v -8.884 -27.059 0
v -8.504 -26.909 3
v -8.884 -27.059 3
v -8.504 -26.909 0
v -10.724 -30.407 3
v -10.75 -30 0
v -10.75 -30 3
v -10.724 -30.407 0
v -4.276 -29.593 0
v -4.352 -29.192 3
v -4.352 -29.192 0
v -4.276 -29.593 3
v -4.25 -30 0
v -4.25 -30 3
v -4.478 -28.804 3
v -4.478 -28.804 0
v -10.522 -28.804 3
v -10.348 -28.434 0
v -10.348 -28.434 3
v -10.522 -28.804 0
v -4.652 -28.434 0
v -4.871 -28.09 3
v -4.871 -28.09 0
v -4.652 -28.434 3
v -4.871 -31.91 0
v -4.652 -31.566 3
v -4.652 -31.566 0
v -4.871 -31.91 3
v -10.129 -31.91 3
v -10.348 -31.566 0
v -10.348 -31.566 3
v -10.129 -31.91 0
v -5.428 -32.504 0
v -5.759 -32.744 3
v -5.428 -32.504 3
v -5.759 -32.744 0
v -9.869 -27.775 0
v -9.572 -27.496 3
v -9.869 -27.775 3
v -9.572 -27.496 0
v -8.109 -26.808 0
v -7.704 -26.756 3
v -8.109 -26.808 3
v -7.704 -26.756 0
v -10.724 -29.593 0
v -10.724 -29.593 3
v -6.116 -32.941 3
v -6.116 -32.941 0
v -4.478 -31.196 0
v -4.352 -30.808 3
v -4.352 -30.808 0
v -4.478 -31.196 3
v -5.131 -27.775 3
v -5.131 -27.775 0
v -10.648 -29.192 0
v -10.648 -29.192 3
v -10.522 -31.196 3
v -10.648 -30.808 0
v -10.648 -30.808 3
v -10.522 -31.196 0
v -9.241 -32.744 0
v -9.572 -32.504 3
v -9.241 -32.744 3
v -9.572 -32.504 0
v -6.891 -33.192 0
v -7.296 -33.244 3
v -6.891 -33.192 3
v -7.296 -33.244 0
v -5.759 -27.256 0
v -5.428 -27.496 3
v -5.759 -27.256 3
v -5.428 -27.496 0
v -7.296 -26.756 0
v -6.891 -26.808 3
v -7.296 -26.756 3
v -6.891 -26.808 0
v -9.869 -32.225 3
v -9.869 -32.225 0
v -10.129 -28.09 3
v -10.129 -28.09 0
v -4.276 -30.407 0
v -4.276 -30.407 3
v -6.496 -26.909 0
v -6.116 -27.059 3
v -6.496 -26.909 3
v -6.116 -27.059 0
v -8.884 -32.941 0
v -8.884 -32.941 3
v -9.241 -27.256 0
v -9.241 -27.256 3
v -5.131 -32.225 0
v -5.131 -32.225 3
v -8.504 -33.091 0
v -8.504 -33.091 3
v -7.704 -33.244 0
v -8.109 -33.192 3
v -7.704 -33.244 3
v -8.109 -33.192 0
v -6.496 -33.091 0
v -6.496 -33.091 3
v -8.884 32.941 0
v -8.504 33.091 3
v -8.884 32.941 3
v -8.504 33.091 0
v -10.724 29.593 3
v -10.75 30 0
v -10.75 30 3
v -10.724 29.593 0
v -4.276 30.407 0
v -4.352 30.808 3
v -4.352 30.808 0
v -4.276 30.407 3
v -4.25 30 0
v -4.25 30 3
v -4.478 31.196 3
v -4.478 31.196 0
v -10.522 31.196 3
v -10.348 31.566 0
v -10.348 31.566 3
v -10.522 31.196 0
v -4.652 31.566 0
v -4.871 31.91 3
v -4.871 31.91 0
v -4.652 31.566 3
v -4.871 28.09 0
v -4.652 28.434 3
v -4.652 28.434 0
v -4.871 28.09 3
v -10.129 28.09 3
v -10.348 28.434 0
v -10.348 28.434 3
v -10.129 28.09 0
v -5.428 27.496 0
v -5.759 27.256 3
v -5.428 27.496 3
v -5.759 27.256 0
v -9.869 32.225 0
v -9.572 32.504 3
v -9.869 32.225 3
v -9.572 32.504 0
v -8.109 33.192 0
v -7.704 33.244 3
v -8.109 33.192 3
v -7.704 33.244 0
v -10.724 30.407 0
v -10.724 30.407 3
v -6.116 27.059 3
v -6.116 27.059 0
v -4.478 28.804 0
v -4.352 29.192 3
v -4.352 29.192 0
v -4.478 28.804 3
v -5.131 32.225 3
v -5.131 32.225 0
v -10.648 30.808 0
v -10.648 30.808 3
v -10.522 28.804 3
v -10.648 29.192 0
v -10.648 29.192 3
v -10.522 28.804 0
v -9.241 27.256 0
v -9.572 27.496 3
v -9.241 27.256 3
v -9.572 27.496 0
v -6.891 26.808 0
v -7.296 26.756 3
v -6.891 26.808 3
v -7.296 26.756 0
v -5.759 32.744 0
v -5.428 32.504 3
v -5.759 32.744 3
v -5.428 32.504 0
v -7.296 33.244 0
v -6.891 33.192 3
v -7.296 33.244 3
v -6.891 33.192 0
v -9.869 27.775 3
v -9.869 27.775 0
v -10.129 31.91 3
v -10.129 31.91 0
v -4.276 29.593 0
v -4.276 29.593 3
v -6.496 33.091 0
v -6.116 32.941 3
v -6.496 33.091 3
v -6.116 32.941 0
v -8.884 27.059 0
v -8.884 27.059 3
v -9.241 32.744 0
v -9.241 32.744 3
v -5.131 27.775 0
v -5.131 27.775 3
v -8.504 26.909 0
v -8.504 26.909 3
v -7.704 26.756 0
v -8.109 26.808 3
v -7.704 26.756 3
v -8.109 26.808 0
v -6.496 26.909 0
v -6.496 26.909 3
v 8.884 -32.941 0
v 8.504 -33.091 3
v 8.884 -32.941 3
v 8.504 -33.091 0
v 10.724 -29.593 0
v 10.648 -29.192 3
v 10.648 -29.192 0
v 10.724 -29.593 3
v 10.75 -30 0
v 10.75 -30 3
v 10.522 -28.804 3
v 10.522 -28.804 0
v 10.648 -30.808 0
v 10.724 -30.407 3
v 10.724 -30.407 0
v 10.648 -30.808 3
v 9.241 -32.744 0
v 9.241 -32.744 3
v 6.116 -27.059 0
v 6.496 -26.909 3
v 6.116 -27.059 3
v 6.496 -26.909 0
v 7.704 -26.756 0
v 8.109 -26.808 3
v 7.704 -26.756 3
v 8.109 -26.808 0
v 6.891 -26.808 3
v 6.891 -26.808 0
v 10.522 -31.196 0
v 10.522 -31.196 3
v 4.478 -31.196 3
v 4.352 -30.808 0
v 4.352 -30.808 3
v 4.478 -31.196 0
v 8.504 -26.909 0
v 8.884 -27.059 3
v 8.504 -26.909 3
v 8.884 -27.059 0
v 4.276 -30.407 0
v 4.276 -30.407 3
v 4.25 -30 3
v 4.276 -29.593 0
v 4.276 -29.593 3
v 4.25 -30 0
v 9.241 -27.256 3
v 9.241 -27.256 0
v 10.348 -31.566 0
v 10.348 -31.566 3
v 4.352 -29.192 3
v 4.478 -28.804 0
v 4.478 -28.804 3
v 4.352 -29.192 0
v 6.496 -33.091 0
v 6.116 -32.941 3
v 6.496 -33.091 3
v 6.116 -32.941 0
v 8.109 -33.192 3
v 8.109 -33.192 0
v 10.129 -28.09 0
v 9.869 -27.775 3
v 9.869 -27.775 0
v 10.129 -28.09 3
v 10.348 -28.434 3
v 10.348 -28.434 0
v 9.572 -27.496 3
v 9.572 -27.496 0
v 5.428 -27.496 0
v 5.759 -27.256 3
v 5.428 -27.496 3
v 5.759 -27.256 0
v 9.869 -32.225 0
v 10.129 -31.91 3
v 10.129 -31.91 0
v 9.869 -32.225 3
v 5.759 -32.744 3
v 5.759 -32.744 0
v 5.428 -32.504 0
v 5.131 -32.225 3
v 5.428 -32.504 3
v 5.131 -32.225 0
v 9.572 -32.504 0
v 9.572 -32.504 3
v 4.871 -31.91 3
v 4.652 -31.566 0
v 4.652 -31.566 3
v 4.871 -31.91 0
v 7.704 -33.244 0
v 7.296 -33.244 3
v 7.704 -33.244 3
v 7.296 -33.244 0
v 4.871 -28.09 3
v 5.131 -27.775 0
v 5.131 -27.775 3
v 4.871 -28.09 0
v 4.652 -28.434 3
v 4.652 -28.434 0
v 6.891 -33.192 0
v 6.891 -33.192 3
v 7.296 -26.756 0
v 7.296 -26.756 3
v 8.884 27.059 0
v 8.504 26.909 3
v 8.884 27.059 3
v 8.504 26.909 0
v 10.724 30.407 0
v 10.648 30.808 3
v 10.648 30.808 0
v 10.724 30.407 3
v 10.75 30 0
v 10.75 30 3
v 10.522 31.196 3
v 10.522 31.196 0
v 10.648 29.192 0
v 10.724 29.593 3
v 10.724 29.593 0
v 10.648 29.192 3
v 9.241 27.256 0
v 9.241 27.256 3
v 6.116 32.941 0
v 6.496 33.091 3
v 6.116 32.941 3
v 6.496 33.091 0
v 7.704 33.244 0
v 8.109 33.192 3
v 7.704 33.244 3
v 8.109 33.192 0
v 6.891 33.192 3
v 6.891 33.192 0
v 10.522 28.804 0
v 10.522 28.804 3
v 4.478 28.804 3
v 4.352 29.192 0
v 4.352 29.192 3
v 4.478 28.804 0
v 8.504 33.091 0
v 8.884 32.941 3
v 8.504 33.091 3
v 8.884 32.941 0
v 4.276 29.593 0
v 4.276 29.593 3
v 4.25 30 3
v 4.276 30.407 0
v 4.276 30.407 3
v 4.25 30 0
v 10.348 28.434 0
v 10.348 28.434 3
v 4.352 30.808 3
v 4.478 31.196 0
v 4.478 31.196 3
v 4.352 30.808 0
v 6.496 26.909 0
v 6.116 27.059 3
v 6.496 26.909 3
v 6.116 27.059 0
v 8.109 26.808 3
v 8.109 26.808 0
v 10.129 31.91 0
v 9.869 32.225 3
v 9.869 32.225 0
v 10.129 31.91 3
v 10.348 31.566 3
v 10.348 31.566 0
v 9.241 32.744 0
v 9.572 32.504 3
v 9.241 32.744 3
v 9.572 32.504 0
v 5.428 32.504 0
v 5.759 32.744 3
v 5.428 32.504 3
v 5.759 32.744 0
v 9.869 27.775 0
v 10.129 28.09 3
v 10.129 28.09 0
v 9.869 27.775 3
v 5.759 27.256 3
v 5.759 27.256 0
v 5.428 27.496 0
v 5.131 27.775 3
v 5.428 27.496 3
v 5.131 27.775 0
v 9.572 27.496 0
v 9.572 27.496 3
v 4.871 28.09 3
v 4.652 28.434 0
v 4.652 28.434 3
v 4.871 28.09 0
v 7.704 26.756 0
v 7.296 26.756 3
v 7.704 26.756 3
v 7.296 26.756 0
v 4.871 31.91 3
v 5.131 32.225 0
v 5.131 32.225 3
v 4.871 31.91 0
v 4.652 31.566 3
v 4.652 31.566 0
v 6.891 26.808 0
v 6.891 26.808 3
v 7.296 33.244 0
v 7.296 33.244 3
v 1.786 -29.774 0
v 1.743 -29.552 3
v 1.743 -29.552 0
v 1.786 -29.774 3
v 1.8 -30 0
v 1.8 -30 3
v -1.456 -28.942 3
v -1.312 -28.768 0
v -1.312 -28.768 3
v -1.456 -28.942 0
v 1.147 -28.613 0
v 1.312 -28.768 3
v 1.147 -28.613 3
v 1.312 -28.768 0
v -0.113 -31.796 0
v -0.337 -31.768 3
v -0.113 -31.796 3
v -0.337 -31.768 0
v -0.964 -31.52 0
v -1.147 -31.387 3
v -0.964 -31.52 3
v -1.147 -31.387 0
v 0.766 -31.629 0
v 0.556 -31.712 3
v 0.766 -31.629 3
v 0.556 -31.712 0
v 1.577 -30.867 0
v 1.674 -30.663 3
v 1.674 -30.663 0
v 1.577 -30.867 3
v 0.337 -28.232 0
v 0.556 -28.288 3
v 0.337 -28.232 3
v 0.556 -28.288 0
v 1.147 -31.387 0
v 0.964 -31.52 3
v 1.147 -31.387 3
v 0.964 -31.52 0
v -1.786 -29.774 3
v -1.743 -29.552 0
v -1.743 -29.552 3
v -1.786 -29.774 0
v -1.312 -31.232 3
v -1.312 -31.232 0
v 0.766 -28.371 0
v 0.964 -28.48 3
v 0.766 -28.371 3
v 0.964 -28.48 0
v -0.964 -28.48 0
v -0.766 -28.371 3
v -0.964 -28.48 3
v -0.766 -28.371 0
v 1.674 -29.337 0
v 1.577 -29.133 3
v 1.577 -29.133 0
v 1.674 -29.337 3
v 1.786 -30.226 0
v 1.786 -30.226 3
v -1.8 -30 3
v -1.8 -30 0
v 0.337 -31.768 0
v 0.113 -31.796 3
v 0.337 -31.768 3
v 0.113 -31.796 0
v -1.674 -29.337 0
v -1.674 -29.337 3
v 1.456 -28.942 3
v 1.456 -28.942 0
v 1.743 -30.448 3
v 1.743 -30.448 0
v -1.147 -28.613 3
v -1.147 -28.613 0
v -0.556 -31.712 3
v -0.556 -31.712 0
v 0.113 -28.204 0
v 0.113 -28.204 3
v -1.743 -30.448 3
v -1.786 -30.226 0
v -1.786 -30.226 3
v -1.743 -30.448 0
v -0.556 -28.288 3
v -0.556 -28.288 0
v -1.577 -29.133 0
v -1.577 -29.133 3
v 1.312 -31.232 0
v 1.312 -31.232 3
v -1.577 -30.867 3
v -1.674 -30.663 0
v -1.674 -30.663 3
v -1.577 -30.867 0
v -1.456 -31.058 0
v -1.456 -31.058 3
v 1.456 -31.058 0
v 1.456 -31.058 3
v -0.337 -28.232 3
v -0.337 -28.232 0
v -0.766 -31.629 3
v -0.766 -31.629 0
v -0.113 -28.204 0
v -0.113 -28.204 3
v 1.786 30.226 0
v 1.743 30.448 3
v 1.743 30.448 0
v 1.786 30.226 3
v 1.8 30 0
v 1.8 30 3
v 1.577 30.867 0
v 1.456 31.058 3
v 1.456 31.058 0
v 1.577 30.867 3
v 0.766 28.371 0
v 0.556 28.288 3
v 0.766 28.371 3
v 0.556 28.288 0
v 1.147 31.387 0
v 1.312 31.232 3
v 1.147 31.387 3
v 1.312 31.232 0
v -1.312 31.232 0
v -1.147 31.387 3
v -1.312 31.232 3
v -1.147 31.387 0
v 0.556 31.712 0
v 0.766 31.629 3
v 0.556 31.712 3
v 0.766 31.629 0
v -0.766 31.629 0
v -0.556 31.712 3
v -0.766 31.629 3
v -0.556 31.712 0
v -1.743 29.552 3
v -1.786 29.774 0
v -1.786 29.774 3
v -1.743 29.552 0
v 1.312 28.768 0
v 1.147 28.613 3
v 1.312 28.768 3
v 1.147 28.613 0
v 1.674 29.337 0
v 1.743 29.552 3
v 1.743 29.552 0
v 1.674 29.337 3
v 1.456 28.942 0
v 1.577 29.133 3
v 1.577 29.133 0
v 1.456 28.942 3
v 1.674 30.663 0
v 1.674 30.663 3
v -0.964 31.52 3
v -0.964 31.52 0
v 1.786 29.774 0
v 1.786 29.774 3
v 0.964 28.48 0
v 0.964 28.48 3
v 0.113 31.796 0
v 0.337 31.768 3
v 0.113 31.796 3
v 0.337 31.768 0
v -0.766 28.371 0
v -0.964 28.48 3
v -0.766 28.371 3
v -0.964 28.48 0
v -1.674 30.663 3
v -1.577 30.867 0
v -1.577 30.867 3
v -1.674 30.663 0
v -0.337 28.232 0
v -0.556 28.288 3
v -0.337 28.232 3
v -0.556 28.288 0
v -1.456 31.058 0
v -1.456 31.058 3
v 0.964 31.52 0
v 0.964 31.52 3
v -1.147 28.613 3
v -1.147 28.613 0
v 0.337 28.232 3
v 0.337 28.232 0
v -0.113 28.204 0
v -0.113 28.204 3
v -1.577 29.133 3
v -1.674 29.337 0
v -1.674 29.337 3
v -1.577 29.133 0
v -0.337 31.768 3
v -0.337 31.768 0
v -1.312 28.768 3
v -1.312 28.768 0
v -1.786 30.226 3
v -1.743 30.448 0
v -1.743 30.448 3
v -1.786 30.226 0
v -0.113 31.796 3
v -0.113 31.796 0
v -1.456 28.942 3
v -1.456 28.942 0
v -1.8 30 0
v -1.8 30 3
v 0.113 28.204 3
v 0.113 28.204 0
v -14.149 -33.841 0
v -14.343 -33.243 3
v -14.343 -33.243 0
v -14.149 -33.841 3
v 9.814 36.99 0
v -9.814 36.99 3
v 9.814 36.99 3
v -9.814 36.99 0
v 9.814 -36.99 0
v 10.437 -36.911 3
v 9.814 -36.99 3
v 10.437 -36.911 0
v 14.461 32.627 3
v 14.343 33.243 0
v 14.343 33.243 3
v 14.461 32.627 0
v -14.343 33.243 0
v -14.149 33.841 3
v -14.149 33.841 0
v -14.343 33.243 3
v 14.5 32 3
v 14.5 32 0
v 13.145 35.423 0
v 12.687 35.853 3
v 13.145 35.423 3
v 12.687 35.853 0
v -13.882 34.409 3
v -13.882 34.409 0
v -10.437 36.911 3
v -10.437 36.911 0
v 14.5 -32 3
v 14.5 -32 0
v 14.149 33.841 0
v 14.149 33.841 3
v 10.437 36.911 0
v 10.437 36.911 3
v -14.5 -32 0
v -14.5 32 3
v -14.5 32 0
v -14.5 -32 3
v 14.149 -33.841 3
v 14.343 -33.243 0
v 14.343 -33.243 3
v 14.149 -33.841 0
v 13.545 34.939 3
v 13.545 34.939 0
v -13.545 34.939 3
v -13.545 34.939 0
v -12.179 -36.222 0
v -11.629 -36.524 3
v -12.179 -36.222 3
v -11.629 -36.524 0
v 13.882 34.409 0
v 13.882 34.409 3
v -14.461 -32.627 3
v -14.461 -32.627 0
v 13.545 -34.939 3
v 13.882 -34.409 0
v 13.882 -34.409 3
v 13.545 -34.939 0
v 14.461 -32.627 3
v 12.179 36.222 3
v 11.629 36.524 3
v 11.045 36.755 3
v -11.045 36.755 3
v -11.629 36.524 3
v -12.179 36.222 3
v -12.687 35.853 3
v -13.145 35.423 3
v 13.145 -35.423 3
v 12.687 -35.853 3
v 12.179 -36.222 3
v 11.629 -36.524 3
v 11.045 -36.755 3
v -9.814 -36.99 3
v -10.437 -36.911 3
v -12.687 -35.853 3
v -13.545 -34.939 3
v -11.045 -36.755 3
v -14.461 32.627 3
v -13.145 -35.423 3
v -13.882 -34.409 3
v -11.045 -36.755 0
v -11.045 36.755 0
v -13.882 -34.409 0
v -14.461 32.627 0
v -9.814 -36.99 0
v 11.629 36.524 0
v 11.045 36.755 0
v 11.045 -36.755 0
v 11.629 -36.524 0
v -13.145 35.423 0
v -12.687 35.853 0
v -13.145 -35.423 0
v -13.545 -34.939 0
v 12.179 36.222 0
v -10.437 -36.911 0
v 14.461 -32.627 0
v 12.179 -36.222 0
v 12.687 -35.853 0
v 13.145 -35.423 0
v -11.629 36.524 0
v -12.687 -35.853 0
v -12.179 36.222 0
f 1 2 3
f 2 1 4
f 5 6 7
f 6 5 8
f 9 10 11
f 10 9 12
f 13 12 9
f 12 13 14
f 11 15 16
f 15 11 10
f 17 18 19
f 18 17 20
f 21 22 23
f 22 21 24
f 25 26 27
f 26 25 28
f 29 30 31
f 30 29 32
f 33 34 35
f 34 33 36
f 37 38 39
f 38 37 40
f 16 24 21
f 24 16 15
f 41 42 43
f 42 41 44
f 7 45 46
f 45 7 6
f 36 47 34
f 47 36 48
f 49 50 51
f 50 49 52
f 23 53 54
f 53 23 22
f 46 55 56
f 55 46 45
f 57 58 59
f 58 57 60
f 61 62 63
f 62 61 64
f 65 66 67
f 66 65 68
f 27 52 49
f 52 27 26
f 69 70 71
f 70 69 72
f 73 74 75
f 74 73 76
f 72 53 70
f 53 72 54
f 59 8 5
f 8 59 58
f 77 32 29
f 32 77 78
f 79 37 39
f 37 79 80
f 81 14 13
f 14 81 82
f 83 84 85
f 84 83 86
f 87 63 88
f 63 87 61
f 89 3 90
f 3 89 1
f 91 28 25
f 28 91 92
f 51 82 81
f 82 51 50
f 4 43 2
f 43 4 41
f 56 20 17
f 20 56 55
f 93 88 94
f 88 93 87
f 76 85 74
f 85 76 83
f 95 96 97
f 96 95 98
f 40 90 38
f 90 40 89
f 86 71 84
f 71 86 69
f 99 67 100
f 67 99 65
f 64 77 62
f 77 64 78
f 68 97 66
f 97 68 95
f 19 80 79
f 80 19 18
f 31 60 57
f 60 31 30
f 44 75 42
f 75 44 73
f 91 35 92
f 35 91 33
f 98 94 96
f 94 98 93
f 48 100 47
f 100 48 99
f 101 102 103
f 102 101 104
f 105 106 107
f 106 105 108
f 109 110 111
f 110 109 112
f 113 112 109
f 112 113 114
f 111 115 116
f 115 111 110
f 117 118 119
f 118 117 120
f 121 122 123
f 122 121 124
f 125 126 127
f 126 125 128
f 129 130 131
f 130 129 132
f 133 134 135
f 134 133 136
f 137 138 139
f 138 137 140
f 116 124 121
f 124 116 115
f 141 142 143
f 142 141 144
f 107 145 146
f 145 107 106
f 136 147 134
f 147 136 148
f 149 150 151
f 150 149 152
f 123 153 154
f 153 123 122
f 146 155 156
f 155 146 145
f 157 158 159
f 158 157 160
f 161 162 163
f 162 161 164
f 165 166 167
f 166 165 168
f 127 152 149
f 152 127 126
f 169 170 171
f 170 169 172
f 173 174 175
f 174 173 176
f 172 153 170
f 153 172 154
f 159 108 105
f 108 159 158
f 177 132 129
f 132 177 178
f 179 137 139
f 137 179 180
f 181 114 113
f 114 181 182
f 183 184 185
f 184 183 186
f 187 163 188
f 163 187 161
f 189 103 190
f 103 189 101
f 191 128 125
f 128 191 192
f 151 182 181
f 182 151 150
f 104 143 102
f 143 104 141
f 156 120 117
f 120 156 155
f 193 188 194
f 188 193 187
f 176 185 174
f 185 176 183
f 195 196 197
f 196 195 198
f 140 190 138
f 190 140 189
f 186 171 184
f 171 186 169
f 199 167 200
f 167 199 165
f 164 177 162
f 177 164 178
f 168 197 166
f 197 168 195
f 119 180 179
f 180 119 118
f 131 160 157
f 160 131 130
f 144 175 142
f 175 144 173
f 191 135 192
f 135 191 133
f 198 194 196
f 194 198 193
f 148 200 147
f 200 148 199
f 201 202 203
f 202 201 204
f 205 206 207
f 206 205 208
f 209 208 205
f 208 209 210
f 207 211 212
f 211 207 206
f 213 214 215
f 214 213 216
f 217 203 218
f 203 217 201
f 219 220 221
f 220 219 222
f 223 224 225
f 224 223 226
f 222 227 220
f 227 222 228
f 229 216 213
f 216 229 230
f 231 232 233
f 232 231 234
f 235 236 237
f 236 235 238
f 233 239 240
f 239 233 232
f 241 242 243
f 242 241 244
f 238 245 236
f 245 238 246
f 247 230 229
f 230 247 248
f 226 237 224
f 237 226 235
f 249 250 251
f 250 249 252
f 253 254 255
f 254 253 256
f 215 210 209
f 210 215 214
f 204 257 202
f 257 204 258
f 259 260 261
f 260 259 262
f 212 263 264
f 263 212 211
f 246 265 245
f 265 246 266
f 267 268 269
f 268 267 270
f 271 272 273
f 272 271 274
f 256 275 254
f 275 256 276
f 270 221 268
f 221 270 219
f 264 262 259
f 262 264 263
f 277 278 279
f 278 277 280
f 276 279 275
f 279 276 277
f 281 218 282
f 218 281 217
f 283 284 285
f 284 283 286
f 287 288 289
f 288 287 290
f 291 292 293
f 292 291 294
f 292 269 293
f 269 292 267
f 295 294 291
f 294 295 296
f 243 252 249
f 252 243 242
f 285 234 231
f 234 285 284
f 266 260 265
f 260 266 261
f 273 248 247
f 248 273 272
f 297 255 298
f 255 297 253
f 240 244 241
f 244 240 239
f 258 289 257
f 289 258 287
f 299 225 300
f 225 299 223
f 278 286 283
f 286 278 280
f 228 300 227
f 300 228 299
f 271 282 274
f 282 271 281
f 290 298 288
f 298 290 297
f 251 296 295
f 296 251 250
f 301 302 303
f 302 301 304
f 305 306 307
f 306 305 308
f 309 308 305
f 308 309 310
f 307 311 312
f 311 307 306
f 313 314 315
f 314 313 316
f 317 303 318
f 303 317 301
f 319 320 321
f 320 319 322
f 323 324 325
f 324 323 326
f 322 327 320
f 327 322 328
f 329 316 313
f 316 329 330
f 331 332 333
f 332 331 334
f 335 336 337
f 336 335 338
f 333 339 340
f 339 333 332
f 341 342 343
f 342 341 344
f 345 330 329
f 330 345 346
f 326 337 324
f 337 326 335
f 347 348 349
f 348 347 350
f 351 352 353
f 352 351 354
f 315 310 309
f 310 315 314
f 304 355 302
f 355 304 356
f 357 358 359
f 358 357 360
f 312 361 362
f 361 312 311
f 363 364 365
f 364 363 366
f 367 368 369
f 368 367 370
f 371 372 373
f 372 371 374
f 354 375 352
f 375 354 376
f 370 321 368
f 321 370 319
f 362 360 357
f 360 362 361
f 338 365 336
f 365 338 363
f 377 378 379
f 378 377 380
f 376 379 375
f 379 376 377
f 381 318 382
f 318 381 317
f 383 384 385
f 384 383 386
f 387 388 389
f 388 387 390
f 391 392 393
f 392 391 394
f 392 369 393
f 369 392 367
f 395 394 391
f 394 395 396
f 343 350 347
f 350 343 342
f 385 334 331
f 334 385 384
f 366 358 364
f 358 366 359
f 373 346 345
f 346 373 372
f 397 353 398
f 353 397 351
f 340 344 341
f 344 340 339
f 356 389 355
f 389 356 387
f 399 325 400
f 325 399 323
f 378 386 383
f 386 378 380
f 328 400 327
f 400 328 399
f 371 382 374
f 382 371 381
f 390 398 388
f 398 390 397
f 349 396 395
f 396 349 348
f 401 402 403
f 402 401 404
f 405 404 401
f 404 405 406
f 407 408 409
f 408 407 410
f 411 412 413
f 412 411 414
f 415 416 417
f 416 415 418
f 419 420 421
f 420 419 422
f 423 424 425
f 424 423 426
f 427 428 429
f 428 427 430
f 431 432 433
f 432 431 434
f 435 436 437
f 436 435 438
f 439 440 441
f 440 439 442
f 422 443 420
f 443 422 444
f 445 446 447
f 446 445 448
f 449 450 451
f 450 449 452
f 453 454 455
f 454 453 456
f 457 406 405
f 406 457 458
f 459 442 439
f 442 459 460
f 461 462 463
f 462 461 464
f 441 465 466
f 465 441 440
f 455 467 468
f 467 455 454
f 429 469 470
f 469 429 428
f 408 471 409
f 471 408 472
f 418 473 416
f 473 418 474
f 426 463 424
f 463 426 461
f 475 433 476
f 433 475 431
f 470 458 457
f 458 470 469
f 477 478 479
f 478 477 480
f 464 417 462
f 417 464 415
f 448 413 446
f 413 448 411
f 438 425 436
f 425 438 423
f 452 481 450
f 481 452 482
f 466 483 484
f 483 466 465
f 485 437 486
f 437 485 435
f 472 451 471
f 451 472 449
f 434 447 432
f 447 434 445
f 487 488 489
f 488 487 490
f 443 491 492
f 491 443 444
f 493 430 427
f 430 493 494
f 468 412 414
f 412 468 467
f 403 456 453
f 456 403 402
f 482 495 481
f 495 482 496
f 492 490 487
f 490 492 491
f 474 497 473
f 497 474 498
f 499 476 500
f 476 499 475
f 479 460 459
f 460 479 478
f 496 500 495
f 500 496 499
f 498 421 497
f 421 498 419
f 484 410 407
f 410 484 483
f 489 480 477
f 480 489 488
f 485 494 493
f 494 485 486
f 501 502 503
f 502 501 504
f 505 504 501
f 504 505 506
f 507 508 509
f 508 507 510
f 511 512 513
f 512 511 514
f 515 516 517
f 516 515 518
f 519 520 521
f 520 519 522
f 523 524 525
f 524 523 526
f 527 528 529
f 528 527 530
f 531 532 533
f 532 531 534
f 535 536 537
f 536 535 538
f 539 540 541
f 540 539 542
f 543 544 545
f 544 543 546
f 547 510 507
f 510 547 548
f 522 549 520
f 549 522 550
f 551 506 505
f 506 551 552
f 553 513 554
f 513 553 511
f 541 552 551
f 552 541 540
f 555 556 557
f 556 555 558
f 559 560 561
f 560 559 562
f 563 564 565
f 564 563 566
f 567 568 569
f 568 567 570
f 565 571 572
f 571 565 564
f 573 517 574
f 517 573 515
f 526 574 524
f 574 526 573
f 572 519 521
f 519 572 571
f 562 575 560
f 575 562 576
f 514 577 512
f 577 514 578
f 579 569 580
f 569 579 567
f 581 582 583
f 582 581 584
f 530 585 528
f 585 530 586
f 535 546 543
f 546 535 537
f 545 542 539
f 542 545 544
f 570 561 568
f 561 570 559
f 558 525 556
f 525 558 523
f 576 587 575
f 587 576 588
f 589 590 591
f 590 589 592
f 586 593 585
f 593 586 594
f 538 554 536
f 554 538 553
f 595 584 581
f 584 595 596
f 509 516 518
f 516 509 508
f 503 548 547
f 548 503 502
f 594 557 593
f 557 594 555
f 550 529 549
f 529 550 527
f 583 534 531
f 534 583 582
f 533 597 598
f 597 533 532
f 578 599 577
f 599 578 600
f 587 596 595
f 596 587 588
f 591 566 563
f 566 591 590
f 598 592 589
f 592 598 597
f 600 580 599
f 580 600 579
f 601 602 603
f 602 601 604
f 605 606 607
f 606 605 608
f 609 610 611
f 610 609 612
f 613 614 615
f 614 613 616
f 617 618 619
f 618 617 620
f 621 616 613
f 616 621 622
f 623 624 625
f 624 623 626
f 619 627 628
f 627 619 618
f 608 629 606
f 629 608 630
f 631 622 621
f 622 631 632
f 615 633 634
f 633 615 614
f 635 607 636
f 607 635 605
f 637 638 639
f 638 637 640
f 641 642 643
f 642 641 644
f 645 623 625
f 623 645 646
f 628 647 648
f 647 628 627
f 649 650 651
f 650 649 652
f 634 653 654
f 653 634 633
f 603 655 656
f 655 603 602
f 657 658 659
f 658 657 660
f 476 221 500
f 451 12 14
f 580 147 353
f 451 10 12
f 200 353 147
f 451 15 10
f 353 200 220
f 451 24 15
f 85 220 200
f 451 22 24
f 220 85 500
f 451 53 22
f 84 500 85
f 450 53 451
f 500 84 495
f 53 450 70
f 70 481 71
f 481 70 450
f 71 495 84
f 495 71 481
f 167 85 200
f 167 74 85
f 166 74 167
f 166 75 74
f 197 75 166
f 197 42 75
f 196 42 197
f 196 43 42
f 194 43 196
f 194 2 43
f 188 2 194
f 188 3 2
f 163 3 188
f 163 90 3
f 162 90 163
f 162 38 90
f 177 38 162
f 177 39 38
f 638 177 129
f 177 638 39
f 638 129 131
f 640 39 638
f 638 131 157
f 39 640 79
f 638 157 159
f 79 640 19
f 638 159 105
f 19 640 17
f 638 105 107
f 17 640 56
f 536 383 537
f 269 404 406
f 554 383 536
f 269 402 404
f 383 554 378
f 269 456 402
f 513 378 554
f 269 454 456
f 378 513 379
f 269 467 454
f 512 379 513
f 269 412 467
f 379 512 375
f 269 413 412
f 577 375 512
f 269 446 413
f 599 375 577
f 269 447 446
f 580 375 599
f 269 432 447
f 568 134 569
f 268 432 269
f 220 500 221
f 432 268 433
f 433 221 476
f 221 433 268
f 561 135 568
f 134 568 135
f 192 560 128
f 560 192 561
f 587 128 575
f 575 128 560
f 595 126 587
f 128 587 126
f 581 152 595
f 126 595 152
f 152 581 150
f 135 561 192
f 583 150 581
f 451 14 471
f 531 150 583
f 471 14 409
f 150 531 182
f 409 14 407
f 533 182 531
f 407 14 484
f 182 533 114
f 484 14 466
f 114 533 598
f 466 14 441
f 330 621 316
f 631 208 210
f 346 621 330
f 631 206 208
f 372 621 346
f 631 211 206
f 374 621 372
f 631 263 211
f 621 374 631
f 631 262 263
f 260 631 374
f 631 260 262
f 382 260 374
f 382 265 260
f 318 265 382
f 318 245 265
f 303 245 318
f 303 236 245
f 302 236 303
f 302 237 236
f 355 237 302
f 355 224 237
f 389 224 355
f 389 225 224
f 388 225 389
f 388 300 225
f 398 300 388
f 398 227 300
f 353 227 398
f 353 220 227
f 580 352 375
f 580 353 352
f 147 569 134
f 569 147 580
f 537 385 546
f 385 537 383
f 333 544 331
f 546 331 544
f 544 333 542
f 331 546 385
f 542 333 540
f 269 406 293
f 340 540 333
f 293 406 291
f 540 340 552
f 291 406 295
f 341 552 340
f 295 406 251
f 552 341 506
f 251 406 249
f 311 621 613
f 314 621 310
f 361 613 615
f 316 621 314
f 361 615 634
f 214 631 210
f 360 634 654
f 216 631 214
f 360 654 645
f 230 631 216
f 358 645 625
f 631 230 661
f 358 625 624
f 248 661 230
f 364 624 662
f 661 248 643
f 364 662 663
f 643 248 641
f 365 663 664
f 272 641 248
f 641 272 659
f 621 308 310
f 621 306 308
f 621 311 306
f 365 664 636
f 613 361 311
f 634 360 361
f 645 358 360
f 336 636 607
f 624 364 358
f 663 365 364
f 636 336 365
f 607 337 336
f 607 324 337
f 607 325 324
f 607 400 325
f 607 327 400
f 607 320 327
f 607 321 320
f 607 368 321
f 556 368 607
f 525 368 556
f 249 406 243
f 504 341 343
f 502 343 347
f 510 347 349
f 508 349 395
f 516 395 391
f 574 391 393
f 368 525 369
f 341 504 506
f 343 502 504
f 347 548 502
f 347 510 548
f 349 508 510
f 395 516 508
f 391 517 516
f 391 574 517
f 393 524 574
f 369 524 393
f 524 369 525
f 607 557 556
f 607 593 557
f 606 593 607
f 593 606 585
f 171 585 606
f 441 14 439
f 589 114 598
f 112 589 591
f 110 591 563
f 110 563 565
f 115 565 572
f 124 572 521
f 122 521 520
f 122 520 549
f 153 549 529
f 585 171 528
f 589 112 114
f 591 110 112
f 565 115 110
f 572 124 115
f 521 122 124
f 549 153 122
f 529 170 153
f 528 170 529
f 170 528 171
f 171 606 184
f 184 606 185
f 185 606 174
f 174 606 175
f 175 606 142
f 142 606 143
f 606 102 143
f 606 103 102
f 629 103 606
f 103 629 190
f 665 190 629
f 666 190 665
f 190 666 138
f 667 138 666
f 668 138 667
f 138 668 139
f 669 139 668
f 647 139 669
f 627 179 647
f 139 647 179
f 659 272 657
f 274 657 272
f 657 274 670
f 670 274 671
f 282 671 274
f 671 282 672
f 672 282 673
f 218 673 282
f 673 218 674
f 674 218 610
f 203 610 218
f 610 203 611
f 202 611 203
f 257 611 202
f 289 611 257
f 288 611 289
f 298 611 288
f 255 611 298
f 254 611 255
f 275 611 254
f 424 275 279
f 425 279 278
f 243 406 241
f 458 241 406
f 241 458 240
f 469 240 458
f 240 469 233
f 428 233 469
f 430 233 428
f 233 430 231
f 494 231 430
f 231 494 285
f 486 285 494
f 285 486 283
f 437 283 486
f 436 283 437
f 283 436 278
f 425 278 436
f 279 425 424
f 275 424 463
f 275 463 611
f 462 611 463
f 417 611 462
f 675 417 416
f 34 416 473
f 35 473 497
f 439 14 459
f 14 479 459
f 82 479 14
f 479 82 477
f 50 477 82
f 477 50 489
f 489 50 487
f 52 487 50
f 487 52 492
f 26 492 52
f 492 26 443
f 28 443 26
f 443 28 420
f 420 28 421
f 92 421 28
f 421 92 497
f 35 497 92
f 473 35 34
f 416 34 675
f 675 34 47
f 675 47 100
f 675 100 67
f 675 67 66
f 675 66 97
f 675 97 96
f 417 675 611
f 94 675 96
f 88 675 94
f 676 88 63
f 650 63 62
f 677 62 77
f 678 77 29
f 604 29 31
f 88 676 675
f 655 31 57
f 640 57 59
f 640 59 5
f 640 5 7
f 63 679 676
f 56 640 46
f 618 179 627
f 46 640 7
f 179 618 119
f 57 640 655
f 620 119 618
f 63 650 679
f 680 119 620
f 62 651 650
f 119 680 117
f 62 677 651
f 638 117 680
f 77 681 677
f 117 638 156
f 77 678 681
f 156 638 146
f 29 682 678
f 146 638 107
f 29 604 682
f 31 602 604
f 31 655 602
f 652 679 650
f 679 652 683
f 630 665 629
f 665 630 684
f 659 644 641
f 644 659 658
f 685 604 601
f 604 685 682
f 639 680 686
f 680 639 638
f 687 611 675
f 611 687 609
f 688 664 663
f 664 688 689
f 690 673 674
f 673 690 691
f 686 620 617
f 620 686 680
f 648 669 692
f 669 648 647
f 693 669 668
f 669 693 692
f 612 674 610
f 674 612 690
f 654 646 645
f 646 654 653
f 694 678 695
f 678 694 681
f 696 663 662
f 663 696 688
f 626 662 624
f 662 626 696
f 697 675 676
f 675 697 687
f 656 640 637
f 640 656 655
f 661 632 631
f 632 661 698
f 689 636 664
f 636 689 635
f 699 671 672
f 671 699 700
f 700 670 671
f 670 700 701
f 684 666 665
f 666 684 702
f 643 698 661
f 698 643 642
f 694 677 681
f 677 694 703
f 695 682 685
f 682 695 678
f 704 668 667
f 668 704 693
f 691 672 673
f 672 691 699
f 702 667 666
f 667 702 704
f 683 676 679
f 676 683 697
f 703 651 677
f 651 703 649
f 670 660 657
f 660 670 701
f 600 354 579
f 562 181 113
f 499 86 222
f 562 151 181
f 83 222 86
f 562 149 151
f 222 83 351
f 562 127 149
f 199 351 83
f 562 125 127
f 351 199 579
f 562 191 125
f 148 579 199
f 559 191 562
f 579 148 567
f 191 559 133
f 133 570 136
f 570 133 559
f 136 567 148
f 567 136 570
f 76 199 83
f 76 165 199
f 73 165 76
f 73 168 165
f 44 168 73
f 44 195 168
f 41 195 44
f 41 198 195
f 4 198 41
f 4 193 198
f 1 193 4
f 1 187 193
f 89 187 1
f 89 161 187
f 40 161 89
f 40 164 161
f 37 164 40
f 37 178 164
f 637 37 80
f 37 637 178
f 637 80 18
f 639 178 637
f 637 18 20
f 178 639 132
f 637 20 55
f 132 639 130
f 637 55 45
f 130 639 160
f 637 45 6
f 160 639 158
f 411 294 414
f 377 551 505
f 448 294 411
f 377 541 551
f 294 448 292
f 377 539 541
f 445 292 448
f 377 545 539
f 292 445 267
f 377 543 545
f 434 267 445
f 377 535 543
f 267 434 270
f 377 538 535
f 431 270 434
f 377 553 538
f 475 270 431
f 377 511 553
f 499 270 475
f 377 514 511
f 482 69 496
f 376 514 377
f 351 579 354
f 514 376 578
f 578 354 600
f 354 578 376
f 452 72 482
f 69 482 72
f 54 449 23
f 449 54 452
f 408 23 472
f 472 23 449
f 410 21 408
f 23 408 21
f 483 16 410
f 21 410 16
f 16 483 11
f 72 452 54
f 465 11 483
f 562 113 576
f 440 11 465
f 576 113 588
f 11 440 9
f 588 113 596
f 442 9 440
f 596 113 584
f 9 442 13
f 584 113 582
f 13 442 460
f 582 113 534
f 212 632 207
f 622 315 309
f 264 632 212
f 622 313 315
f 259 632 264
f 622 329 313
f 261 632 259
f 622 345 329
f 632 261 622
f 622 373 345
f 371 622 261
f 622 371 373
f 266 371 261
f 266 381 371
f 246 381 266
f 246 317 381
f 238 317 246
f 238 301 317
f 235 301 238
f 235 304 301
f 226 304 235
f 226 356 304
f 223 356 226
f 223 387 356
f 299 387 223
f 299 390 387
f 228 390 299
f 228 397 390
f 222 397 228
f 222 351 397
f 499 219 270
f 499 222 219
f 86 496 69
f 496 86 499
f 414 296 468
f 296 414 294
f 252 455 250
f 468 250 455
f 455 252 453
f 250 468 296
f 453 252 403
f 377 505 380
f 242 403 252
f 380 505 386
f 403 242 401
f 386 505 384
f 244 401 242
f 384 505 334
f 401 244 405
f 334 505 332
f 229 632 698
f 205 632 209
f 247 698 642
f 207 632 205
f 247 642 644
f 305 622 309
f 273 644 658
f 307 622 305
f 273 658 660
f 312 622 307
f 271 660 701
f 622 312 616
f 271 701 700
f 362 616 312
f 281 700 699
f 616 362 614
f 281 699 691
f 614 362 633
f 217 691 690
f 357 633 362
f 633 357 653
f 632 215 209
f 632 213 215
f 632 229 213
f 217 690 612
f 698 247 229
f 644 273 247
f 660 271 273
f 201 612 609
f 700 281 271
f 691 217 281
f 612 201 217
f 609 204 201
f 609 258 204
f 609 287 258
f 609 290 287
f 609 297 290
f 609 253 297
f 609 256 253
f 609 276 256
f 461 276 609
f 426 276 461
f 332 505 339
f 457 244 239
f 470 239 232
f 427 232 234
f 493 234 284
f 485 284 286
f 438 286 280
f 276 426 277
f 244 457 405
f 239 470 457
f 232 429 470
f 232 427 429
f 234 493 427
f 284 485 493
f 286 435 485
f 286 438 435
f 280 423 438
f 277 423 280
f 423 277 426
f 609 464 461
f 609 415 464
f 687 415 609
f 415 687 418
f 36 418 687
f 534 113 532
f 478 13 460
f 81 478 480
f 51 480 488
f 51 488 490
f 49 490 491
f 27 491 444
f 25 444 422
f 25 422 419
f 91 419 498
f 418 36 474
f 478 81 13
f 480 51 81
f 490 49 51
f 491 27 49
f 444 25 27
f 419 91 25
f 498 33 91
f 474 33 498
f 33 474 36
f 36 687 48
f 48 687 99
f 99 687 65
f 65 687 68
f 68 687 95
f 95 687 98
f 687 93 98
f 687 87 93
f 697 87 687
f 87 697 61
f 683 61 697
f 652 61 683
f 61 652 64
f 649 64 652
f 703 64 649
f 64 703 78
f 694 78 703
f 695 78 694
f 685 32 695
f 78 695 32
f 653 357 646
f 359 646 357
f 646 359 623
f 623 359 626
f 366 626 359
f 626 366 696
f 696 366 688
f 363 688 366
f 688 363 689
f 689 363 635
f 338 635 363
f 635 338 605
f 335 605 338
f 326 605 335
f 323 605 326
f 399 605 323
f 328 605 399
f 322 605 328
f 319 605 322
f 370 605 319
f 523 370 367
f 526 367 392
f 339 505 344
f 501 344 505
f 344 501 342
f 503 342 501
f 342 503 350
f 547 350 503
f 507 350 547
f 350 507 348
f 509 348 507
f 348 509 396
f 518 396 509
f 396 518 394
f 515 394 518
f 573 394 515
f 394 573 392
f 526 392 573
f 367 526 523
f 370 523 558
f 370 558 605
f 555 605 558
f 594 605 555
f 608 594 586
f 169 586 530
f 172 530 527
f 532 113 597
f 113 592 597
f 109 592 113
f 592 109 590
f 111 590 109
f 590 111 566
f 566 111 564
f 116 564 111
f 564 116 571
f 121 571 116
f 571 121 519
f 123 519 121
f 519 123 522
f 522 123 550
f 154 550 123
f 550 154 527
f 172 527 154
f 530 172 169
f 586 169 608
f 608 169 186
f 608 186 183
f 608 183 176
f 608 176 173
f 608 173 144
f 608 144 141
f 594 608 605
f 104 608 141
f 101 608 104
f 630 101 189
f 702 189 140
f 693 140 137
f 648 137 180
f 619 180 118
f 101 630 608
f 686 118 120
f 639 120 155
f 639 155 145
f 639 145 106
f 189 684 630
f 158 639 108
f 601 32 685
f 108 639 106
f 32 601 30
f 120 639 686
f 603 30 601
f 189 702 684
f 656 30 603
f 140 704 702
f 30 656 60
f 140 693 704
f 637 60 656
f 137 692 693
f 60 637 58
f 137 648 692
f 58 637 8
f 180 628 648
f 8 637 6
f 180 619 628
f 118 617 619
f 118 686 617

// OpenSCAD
$fn = 50;

difference() {
	union() {
		hull() {
			translate(v = [-9.5, 32.0, 0]) {
				cylinder(h = 3, r = 5);
			}
			translate(v = [9.5, 32.0, 0]) {
				cylinder(h = 3, r = 5);
			}
			translate(v = [-9.5, -32.0, 0]) {
				cylinder(h = 3, r = 5);
			}
			translate(v = [9.5, -32.0, 0]) {
				cylinder(h = 3, r = 5);
			}
		}
	}
	union() {
		translate(v = [-7.5, -30.0, -1]) {
			cylinder(h = 5, r = 3.25);
		}
		translate(v = [-7.5, 30.0, -1]) {
			cylinder(h = 5, r = 3.25);
		}
		translate(v = [7.5, -30.0, -1]) {
			cylinder(h = 5, r = 3.25);
		}
		translate(v = [7.5, 30.0, -1]) {
			cylinder(h = 5, r = 3.25);
		}
		translate(v = [0.0, -30.0, -1]) {
			cylinder(h = 5, r = 1.8);
		}
		translate(v = [0.0, 30.0, -1]) {
			cylinder(h = 5, r = 1.8);
		}
	}
}
